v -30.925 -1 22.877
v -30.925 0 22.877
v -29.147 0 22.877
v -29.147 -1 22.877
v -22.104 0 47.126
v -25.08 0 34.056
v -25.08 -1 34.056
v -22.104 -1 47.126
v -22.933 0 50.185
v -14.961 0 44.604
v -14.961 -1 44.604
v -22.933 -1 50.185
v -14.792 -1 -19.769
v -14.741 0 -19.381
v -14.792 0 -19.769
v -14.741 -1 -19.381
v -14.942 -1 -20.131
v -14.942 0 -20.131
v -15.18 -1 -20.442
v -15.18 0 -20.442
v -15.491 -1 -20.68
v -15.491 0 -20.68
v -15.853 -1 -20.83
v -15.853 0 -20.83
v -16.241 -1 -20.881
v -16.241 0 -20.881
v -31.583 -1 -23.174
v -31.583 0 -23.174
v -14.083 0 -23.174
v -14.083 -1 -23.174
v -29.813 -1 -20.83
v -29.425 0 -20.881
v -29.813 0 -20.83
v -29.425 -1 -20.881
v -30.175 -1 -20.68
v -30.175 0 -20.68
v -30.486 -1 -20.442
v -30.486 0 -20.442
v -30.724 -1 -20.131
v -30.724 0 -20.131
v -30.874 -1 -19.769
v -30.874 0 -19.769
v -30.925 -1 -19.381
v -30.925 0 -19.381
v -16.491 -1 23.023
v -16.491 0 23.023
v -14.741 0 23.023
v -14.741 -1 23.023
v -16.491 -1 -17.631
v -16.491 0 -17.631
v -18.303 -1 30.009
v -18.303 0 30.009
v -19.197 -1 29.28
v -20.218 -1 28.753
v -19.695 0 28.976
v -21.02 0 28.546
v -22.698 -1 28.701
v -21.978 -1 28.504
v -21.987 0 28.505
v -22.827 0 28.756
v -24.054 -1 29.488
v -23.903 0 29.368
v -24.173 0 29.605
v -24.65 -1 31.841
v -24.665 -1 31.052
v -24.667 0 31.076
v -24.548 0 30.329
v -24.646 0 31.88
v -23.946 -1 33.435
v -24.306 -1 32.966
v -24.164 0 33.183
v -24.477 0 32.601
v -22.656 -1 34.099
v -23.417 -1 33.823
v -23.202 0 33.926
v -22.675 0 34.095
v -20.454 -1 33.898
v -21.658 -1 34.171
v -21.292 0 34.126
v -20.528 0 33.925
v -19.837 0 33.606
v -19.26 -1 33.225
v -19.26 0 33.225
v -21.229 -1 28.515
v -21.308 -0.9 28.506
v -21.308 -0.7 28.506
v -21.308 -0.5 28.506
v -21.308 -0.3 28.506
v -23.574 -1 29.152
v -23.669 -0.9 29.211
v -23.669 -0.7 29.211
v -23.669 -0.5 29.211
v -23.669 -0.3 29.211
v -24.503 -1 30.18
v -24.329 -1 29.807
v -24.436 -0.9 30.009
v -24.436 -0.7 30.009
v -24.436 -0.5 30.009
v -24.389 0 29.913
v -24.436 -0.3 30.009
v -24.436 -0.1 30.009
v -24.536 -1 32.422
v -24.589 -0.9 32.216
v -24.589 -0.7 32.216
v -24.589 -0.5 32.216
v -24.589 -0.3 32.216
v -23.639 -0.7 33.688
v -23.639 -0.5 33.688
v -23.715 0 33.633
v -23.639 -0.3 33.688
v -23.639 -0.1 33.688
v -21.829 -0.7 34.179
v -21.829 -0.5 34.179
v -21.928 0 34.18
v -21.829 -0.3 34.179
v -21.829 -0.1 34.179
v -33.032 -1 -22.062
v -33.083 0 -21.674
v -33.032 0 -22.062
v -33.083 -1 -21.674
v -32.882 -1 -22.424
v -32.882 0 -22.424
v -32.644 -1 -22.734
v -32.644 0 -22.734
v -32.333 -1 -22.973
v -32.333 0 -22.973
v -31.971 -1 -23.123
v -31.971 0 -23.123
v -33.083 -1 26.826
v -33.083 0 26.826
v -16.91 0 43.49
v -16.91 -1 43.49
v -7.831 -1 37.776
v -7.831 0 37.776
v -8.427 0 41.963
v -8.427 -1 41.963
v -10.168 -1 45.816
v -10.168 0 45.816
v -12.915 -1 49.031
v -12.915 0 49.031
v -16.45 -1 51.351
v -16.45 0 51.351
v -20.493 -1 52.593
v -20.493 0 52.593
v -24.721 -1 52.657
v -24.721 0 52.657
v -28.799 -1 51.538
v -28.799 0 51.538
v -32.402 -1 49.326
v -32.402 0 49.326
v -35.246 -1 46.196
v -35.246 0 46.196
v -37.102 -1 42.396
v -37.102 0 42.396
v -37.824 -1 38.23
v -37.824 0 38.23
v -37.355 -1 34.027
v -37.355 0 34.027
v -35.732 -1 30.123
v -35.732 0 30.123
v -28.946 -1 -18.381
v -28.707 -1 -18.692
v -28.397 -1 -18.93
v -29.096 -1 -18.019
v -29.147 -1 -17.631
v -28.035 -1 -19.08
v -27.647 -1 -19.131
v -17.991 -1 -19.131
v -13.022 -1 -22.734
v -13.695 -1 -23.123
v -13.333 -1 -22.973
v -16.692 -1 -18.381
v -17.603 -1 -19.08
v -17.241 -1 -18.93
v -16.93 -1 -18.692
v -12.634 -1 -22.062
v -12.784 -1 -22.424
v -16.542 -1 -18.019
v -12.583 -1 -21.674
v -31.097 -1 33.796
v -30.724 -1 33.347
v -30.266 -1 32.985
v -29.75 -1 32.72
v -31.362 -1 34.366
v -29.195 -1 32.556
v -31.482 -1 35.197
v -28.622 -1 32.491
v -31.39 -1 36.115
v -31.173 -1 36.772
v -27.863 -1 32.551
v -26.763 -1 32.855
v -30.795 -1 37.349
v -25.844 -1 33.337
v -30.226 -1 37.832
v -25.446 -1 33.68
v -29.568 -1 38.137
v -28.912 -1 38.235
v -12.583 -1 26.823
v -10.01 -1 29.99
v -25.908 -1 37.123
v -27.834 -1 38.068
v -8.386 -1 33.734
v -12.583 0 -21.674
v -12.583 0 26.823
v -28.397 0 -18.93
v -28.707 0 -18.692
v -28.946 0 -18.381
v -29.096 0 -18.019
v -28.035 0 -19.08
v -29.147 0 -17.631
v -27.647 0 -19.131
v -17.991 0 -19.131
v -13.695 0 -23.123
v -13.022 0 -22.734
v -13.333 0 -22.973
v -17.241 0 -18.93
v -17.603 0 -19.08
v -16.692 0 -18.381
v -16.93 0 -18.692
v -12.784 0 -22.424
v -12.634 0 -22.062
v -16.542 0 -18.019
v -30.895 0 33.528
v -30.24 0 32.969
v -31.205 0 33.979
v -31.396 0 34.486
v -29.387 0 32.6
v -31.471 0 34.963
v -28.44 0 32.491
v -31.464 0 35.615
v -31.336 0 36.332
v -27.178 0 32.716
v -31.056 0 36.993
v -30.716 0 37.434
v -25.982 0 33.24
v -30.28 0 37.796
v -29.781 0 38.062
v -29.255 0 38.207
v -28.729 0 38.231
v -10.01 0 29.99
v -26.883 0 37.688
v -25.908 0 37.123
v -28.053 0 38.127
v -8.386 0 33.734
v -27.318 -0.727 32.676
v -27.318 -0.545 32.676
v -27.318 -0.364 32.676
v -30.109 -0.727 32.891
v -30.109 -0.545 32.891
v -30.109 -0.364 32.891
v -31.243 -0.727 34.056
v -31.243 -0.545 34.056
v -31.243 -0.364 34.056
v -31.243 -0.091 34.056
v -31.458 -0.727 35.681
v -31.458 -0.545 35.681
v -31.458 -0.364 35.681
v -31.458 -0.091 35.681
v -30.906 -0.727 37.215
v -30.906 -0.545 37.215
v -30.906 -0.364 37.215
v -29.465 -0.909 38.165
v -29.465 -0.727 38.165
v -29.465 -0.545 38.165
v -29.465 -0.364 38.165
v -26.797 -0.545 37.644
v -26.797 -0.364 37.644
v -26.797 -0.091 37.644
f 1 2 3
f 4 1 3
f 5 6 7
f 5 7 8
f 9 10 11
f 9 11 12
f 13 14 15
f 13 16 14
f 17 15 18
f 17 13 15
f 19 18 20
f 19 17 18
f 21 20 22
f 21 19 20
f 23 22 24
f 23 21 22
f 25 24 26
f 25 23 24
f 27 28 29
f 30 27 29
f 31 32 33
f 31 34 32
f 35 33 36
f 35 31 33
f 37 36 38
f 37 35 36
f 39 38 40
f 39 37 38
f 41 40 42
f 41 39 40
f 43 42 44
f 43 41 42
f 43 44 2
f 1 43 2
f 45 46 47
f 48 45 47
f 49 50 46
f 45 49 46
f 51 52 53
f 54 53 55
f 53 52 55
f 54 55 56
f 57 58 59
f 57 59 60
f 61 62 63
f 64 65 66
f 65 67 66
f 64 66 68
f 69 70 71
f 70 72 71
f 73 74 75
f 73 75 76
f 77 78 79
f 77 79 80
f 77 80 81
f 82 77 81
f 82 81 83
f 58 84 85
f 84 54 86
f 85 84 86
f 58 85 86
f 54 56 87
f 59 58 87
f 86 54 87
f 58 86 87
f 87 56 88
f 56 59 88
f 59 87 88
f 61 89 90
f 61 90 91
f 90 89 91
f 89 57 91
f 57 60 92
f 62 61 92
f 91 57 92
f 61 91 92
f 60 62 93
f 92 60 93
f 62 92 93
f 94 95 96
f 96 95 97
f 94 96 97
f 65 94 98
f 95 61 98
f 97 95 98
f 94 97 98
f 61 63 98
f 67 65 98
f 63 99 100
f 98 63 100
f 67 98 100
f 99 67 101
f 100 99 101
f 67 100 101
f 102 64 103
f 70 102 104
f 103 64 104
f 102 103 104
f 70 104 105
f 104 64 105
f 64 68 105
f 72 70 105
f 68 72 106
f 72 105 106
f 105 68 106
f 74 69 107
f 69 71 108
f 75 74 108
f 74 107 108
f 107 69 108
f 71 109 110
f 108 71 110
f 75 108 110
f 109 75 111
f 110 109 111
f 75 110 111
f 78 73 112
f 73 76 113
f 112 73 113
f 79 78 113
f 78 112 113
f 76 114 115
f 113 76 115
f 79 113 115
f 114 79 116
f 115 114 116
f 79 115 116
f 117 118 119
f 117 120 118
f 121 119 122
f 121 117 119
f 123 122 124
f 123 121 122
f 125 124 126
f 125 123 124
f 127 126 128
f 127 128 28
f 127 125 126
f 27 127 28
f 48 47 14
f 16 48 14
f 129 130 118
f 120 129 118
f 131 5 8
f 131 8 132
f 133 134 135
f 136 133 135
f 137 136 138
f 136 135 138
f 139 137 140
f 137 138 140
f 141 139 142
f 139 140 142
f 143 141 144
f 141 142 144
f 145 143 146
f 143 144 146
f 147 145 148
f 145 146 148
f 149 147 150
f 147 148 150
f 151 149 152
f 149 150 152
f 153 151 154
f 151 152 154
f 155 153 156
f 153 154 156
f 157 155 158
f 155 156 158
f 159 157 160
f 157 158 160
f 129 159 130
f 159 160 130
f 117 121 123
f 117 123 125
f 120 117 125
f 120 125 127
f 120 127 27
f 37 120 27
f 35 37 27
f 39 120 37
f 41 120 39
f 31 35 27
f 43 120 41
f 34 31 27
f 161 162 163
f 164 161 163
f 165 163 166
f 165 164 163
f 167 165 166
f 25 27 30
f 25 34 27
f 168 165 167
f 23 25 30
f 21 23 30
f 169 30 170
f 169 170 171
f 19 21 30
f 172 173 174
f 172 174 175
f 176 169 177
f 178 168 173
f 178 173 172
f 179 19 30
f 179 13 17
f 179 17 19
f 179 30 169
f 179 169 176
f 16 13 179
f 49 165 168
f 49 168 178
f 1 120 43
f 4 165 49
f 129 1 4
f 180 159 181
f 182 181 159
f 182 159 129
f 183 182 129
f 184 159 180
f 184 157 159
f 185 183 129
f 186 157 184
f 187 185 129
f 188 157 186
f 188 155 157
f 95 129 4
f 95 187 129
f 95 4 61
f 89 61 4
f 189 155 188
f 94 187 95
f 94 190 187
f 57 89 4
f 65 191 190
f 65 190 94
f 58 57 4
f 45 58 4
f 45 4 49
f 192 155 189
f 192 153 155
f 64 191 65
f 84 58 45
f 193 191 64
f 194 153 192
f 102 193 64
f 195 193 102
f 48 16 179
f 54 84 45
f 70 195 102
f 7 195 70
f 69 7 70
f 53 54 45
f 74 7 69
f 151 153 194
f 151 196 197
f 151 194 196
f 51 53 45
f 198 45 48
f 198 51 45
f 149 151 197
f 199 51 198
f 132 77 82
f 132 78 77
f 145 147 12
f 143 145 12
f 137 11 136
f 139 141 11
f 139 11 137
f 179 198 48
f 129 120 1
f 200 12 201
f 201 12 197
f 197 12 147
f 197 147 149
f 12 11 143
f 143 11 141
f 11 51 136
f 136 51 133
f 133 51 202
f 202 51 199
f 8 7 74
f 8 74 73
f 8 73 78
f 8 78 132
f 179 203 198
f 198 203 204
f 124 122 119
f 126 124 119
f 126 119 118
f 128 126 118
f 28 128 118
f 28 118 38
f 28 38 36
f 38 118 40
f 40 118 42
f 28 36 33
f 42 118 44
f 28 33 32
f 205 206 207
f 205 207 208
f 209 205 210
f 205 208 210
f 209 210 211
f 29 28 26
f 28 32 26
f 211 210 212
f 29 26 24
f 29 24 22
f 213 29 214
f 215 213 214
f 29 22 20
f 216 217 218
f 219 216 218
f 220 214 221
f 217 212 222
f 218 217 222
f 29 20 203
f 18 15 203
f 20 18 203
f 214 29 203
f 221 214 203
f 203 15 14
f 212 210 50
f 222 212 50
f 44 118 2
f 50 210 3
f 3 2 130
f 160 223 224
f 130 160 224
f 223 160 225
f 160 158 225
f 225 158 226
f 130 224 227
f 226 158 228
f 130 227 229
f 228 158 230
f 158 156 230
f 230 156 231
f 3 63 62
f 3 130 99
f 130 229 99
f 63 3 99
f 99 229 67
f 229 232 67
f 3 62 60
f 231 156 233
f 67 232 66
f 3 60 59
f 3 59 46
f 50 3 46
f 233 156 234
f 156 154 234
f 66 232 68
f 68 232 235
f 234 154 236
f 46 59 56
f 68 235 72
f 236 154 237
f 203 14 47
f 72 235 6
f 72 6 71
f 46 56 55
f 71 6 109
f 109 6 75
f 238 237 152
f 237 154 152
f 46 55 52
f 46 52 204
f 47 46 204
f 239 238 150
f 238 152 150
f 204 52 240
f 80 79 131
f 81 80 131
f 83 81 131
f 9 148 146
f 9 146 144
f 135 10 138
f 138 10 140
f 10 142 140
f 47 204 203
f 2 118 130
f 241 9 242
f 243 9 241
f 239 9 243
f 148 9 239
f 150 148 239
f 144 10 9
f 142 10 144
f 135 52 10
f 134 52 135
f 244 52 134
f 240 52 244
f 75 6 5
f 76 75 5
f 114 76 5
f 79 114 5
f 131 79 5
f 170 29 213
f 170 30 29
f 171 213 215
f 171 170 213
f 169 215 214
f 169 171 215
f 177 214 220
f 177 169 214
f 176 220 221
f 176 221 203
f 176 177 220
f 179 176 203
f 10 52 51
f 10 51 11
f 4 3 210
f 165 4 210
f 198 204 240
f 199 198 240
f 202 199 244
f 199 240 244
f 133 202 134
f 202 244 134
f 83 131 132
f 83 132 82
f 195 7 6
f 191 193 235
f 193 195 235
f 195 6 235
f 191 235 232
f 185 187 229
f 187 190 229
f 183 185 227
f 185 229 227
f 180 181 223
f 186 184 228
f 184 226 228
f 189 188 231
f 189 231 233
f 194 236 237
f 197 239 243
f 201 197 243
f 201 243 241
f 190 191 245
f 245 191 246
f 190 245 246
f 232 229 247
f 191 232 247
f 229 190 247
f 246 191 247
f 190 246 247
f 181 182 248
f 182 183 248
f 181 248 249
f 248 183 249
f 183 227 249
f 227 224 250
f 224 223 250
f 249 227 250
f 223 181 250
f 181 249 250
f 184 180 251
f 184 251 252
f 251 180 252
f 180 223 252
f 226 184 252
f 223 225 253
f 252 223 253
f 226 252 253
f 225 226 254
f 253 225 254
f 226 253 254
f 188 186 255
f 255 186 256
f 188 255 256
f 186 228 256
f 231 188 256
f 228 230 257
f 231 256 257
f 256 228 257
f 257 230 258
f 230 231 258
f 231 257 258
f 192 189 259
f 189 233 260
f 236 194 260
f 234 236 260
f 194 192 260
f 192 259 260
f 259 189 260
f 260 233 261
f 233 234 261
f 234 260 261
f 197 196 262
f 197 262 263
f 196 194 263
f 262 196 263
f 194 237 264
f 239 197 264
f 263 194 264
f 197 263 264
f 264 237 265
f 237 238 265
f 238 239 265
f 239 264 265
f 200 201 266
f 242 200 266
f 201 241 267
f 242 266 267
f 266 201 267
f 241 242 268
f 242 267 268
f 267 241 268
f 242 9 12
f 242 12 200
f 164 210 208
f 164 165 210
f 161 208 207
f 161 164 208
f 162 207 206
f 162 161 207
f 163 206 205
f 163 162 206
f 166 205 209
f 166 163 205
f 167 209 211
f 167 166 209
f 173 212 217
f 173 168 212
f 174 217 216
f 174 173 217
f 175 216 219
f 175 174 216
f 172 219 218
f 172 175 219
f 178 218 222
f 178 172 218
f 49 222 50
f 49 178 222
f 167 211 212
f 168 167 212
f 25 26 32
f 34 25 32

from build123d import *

# Parameters (mm, degrees)
F1_DEPTH      = 1
F2_R          = 1.5
F3_R          = 1.5
F4_R          = 1.5
F5_R          = 1.5
F7_DEPTH      = 2
F7_DEPTH_BACK = 2


with BuildPart() as f1:
    # F0 (on Front) → F1 (new body)
    with BuildSketch(Plane.XZ):
        with BuildLine():
            Line((-12.582927011, 26.8263705075), (-33.082927011, 26.8263705075))
            ThreePointArc((-33.082927011, 26.8263705075), (-22.833574452, 22.7763292614), (-12.582927011, 26.8230920433))
            Line((-12.582927011, 26.8230920433), (-12.582927011, 26.8263705075))
        make_face()
        with BuildLine():
            ThreePointArc((-12.582927011, 26.8230920433), (-9.0702939094, 31.8065605846), (-7.8311755758, 37.7763290696))
            ThreePointArc((-7.8311755758, 37.7763290696), (-28.7987432743, 51.5381652757), (-33.082927011, 26.8263705075))
            Line((-33.082927011, 26.8263705075), (-12.582927011, 26.8263705075))
            Line((-12.582927011, 26.8263705075), (-12.582927011, 26.8230920433))
        make_face()
        with BuildLine():
            ThreePointArc((-12.582927011, 26.8230920433), (-22.833574452, 22.7763292614), (-33.082927011, 26.8263705075))
            Line((-33.082927011, 26.8263705075), (-33.082927011, -23.1736294925))
            Line((-33.082927011, -23.1736294925), (-12.582927011, -23.1736294925))
            Line((-12.582927011, -23.1736294925), (-12.582927011, 26.8230920433))
        make_face()
        Polygon((-30.924927011, -19.1308837384), (-30.924927011, 22.8768941015), (-29.1468191239, 22.8768941015), (-29.1468191239, -19.1308837384), (-16.4909848869, -19.1308837384), (-16.4909848869, 23.0227541178), (-14.7409848869, 23.0227541178), (-14.7409848869, -19.1308837384), (-14.7409848869, -20.8812095225), (-16.4909848869, -20.8812095225), (-29.1468191239, -20.8812095225), (-30.924927011, -20.8812095225), align=None, mode=Mode.SUBTRACT)
    extrude(amount=F1_DEPTH)

    # F2
    f2_edges = [f1.edges().sort_by_distance(p)[0] for p in [
        (-33.082927, -0.5, -23.173629),
        (-29.146819, -0.5, -19.130884),
    ]]
    fillet(f2_edges, radius=F2_R)

    # F3
    f3_edges = [f1.edges().sort_by_distance(p)[0] for p in [
        (-12.582927, -0.5, -23.173629),
        (-16.490985, -0.5, -19.130884),
    ]]
    fillet(f3_edges, radius=F3_R)

    # F4
    f4_edges = [f1.edges().sort_by_distance(p)[0] for p in [
        (-14.740985, -0.5, -20.88121),
    ]]
    fillet(f4_edges, radius=F4_R)

    # F5
    f5_edges = [f1.edges().sort_by_distance(p)[0] for p in [
        (-30.924927, -0.5, -20.88121),
    ]]
    fillet(f5_edges, radius=F5_R)

    # F6 (on Front) → F7 (cut, two sides)
    with BuildSketch(Plane.XZ) as f7_sk:
        with BuildLine():
            Line((-22.933350876, 50.1851327717), (-25.9076971561, 37.1225401759))
            add(Edge.make_bspline(
                [(-25.0797867775, 34.0562053025), (-25.3609096182, 33.7585758872), (-25.9441535641, 33.1410858455), (-27.3182486706, 32.6325086478), (-28.6685969713, 32.3924554697), (-30.1767118002, 32.7656618857), (-31.4376451635, 33.9753036652), (-31.5552921939, 35.6990873468), (-31.0846106959, 37.3228691535), (-29.5080944822, 38.3618798355), (-27.9575632828, 38.1700241498), (-26.7953208757, 37.6759371361), (-26.1938047499, 37.3009165185), (-25.9076971561, 37.1225401759)],
                knots=[0, 0, 0, 0, 0.084248841, 0.1747905874, 0.2631617867, 0.3557672882, 0.4523448771, 0.5493064131, 0.6459783357, 0.7454841832, 0.8383514519, 0.9231128225, 1, 1, 1, 1], degree=3))
            Line((-25.0797867775, 34.0562053025), (-22.1039076981, 47.1255295732))
            Line((-22.1039076981, 47.1255295732), (-16.9097921359, 43.4896490436))
            Line((-16.9097921359, 43.4896490436), (-19.2603488405, 33.22483214))
            add(Edge.make_bspline(
                [(-18.3031838387, 30.0086420029), (-18.7477703665, 29.6189181536), (-19.6158886751, 28.8579251286), (-21.3020885386, 28.4383556198), (-22.414443159, 28.5059758099), (-23.7090984524, 29.1968199204), (-24.6315072114, 29.9020393492), (-24.8118553907, 32.312074703), (-23.7838236389, 33.8688571638), (-21.8398009443, 34.3519133542), (-20.1468753191, 33.8435589575), (-19.562668302, 33.4389105276), (-19.2603488405, 33.22483214)],
                knots=[0, 0, 0, 0, 0.1066431649, 0.2103744203, 0.2951230217, 0.3903583058, 0.4750417804, 0.5948311616, 0.7014173376, 0.8116627094, 0.9167484333, 1, 1, 1, 1], degree=3))
            Line((-18.3031838387, 30.0086420029), (-14.9608775973, 44.6044020355))
            Line((-14.9608775973, 44.6044020355), (-22.933350876, 50.1851327717))
        make_face()
        Polygon((-7.1242011416, 31.8749807051), (-3.9289291017, 42.9637953639), (-3.6031708381, 44.3944450197), (-4.0062949993, 45.5680526793), align=None)
    extrude(amount=F7_DEPTH, mode=Mode.SUBTRACT)
    extrude(f7_sk.sketch, amount=-F7_DEPTH_BACK, mode=Mode.SUBTRACT)


solid = f1.part
